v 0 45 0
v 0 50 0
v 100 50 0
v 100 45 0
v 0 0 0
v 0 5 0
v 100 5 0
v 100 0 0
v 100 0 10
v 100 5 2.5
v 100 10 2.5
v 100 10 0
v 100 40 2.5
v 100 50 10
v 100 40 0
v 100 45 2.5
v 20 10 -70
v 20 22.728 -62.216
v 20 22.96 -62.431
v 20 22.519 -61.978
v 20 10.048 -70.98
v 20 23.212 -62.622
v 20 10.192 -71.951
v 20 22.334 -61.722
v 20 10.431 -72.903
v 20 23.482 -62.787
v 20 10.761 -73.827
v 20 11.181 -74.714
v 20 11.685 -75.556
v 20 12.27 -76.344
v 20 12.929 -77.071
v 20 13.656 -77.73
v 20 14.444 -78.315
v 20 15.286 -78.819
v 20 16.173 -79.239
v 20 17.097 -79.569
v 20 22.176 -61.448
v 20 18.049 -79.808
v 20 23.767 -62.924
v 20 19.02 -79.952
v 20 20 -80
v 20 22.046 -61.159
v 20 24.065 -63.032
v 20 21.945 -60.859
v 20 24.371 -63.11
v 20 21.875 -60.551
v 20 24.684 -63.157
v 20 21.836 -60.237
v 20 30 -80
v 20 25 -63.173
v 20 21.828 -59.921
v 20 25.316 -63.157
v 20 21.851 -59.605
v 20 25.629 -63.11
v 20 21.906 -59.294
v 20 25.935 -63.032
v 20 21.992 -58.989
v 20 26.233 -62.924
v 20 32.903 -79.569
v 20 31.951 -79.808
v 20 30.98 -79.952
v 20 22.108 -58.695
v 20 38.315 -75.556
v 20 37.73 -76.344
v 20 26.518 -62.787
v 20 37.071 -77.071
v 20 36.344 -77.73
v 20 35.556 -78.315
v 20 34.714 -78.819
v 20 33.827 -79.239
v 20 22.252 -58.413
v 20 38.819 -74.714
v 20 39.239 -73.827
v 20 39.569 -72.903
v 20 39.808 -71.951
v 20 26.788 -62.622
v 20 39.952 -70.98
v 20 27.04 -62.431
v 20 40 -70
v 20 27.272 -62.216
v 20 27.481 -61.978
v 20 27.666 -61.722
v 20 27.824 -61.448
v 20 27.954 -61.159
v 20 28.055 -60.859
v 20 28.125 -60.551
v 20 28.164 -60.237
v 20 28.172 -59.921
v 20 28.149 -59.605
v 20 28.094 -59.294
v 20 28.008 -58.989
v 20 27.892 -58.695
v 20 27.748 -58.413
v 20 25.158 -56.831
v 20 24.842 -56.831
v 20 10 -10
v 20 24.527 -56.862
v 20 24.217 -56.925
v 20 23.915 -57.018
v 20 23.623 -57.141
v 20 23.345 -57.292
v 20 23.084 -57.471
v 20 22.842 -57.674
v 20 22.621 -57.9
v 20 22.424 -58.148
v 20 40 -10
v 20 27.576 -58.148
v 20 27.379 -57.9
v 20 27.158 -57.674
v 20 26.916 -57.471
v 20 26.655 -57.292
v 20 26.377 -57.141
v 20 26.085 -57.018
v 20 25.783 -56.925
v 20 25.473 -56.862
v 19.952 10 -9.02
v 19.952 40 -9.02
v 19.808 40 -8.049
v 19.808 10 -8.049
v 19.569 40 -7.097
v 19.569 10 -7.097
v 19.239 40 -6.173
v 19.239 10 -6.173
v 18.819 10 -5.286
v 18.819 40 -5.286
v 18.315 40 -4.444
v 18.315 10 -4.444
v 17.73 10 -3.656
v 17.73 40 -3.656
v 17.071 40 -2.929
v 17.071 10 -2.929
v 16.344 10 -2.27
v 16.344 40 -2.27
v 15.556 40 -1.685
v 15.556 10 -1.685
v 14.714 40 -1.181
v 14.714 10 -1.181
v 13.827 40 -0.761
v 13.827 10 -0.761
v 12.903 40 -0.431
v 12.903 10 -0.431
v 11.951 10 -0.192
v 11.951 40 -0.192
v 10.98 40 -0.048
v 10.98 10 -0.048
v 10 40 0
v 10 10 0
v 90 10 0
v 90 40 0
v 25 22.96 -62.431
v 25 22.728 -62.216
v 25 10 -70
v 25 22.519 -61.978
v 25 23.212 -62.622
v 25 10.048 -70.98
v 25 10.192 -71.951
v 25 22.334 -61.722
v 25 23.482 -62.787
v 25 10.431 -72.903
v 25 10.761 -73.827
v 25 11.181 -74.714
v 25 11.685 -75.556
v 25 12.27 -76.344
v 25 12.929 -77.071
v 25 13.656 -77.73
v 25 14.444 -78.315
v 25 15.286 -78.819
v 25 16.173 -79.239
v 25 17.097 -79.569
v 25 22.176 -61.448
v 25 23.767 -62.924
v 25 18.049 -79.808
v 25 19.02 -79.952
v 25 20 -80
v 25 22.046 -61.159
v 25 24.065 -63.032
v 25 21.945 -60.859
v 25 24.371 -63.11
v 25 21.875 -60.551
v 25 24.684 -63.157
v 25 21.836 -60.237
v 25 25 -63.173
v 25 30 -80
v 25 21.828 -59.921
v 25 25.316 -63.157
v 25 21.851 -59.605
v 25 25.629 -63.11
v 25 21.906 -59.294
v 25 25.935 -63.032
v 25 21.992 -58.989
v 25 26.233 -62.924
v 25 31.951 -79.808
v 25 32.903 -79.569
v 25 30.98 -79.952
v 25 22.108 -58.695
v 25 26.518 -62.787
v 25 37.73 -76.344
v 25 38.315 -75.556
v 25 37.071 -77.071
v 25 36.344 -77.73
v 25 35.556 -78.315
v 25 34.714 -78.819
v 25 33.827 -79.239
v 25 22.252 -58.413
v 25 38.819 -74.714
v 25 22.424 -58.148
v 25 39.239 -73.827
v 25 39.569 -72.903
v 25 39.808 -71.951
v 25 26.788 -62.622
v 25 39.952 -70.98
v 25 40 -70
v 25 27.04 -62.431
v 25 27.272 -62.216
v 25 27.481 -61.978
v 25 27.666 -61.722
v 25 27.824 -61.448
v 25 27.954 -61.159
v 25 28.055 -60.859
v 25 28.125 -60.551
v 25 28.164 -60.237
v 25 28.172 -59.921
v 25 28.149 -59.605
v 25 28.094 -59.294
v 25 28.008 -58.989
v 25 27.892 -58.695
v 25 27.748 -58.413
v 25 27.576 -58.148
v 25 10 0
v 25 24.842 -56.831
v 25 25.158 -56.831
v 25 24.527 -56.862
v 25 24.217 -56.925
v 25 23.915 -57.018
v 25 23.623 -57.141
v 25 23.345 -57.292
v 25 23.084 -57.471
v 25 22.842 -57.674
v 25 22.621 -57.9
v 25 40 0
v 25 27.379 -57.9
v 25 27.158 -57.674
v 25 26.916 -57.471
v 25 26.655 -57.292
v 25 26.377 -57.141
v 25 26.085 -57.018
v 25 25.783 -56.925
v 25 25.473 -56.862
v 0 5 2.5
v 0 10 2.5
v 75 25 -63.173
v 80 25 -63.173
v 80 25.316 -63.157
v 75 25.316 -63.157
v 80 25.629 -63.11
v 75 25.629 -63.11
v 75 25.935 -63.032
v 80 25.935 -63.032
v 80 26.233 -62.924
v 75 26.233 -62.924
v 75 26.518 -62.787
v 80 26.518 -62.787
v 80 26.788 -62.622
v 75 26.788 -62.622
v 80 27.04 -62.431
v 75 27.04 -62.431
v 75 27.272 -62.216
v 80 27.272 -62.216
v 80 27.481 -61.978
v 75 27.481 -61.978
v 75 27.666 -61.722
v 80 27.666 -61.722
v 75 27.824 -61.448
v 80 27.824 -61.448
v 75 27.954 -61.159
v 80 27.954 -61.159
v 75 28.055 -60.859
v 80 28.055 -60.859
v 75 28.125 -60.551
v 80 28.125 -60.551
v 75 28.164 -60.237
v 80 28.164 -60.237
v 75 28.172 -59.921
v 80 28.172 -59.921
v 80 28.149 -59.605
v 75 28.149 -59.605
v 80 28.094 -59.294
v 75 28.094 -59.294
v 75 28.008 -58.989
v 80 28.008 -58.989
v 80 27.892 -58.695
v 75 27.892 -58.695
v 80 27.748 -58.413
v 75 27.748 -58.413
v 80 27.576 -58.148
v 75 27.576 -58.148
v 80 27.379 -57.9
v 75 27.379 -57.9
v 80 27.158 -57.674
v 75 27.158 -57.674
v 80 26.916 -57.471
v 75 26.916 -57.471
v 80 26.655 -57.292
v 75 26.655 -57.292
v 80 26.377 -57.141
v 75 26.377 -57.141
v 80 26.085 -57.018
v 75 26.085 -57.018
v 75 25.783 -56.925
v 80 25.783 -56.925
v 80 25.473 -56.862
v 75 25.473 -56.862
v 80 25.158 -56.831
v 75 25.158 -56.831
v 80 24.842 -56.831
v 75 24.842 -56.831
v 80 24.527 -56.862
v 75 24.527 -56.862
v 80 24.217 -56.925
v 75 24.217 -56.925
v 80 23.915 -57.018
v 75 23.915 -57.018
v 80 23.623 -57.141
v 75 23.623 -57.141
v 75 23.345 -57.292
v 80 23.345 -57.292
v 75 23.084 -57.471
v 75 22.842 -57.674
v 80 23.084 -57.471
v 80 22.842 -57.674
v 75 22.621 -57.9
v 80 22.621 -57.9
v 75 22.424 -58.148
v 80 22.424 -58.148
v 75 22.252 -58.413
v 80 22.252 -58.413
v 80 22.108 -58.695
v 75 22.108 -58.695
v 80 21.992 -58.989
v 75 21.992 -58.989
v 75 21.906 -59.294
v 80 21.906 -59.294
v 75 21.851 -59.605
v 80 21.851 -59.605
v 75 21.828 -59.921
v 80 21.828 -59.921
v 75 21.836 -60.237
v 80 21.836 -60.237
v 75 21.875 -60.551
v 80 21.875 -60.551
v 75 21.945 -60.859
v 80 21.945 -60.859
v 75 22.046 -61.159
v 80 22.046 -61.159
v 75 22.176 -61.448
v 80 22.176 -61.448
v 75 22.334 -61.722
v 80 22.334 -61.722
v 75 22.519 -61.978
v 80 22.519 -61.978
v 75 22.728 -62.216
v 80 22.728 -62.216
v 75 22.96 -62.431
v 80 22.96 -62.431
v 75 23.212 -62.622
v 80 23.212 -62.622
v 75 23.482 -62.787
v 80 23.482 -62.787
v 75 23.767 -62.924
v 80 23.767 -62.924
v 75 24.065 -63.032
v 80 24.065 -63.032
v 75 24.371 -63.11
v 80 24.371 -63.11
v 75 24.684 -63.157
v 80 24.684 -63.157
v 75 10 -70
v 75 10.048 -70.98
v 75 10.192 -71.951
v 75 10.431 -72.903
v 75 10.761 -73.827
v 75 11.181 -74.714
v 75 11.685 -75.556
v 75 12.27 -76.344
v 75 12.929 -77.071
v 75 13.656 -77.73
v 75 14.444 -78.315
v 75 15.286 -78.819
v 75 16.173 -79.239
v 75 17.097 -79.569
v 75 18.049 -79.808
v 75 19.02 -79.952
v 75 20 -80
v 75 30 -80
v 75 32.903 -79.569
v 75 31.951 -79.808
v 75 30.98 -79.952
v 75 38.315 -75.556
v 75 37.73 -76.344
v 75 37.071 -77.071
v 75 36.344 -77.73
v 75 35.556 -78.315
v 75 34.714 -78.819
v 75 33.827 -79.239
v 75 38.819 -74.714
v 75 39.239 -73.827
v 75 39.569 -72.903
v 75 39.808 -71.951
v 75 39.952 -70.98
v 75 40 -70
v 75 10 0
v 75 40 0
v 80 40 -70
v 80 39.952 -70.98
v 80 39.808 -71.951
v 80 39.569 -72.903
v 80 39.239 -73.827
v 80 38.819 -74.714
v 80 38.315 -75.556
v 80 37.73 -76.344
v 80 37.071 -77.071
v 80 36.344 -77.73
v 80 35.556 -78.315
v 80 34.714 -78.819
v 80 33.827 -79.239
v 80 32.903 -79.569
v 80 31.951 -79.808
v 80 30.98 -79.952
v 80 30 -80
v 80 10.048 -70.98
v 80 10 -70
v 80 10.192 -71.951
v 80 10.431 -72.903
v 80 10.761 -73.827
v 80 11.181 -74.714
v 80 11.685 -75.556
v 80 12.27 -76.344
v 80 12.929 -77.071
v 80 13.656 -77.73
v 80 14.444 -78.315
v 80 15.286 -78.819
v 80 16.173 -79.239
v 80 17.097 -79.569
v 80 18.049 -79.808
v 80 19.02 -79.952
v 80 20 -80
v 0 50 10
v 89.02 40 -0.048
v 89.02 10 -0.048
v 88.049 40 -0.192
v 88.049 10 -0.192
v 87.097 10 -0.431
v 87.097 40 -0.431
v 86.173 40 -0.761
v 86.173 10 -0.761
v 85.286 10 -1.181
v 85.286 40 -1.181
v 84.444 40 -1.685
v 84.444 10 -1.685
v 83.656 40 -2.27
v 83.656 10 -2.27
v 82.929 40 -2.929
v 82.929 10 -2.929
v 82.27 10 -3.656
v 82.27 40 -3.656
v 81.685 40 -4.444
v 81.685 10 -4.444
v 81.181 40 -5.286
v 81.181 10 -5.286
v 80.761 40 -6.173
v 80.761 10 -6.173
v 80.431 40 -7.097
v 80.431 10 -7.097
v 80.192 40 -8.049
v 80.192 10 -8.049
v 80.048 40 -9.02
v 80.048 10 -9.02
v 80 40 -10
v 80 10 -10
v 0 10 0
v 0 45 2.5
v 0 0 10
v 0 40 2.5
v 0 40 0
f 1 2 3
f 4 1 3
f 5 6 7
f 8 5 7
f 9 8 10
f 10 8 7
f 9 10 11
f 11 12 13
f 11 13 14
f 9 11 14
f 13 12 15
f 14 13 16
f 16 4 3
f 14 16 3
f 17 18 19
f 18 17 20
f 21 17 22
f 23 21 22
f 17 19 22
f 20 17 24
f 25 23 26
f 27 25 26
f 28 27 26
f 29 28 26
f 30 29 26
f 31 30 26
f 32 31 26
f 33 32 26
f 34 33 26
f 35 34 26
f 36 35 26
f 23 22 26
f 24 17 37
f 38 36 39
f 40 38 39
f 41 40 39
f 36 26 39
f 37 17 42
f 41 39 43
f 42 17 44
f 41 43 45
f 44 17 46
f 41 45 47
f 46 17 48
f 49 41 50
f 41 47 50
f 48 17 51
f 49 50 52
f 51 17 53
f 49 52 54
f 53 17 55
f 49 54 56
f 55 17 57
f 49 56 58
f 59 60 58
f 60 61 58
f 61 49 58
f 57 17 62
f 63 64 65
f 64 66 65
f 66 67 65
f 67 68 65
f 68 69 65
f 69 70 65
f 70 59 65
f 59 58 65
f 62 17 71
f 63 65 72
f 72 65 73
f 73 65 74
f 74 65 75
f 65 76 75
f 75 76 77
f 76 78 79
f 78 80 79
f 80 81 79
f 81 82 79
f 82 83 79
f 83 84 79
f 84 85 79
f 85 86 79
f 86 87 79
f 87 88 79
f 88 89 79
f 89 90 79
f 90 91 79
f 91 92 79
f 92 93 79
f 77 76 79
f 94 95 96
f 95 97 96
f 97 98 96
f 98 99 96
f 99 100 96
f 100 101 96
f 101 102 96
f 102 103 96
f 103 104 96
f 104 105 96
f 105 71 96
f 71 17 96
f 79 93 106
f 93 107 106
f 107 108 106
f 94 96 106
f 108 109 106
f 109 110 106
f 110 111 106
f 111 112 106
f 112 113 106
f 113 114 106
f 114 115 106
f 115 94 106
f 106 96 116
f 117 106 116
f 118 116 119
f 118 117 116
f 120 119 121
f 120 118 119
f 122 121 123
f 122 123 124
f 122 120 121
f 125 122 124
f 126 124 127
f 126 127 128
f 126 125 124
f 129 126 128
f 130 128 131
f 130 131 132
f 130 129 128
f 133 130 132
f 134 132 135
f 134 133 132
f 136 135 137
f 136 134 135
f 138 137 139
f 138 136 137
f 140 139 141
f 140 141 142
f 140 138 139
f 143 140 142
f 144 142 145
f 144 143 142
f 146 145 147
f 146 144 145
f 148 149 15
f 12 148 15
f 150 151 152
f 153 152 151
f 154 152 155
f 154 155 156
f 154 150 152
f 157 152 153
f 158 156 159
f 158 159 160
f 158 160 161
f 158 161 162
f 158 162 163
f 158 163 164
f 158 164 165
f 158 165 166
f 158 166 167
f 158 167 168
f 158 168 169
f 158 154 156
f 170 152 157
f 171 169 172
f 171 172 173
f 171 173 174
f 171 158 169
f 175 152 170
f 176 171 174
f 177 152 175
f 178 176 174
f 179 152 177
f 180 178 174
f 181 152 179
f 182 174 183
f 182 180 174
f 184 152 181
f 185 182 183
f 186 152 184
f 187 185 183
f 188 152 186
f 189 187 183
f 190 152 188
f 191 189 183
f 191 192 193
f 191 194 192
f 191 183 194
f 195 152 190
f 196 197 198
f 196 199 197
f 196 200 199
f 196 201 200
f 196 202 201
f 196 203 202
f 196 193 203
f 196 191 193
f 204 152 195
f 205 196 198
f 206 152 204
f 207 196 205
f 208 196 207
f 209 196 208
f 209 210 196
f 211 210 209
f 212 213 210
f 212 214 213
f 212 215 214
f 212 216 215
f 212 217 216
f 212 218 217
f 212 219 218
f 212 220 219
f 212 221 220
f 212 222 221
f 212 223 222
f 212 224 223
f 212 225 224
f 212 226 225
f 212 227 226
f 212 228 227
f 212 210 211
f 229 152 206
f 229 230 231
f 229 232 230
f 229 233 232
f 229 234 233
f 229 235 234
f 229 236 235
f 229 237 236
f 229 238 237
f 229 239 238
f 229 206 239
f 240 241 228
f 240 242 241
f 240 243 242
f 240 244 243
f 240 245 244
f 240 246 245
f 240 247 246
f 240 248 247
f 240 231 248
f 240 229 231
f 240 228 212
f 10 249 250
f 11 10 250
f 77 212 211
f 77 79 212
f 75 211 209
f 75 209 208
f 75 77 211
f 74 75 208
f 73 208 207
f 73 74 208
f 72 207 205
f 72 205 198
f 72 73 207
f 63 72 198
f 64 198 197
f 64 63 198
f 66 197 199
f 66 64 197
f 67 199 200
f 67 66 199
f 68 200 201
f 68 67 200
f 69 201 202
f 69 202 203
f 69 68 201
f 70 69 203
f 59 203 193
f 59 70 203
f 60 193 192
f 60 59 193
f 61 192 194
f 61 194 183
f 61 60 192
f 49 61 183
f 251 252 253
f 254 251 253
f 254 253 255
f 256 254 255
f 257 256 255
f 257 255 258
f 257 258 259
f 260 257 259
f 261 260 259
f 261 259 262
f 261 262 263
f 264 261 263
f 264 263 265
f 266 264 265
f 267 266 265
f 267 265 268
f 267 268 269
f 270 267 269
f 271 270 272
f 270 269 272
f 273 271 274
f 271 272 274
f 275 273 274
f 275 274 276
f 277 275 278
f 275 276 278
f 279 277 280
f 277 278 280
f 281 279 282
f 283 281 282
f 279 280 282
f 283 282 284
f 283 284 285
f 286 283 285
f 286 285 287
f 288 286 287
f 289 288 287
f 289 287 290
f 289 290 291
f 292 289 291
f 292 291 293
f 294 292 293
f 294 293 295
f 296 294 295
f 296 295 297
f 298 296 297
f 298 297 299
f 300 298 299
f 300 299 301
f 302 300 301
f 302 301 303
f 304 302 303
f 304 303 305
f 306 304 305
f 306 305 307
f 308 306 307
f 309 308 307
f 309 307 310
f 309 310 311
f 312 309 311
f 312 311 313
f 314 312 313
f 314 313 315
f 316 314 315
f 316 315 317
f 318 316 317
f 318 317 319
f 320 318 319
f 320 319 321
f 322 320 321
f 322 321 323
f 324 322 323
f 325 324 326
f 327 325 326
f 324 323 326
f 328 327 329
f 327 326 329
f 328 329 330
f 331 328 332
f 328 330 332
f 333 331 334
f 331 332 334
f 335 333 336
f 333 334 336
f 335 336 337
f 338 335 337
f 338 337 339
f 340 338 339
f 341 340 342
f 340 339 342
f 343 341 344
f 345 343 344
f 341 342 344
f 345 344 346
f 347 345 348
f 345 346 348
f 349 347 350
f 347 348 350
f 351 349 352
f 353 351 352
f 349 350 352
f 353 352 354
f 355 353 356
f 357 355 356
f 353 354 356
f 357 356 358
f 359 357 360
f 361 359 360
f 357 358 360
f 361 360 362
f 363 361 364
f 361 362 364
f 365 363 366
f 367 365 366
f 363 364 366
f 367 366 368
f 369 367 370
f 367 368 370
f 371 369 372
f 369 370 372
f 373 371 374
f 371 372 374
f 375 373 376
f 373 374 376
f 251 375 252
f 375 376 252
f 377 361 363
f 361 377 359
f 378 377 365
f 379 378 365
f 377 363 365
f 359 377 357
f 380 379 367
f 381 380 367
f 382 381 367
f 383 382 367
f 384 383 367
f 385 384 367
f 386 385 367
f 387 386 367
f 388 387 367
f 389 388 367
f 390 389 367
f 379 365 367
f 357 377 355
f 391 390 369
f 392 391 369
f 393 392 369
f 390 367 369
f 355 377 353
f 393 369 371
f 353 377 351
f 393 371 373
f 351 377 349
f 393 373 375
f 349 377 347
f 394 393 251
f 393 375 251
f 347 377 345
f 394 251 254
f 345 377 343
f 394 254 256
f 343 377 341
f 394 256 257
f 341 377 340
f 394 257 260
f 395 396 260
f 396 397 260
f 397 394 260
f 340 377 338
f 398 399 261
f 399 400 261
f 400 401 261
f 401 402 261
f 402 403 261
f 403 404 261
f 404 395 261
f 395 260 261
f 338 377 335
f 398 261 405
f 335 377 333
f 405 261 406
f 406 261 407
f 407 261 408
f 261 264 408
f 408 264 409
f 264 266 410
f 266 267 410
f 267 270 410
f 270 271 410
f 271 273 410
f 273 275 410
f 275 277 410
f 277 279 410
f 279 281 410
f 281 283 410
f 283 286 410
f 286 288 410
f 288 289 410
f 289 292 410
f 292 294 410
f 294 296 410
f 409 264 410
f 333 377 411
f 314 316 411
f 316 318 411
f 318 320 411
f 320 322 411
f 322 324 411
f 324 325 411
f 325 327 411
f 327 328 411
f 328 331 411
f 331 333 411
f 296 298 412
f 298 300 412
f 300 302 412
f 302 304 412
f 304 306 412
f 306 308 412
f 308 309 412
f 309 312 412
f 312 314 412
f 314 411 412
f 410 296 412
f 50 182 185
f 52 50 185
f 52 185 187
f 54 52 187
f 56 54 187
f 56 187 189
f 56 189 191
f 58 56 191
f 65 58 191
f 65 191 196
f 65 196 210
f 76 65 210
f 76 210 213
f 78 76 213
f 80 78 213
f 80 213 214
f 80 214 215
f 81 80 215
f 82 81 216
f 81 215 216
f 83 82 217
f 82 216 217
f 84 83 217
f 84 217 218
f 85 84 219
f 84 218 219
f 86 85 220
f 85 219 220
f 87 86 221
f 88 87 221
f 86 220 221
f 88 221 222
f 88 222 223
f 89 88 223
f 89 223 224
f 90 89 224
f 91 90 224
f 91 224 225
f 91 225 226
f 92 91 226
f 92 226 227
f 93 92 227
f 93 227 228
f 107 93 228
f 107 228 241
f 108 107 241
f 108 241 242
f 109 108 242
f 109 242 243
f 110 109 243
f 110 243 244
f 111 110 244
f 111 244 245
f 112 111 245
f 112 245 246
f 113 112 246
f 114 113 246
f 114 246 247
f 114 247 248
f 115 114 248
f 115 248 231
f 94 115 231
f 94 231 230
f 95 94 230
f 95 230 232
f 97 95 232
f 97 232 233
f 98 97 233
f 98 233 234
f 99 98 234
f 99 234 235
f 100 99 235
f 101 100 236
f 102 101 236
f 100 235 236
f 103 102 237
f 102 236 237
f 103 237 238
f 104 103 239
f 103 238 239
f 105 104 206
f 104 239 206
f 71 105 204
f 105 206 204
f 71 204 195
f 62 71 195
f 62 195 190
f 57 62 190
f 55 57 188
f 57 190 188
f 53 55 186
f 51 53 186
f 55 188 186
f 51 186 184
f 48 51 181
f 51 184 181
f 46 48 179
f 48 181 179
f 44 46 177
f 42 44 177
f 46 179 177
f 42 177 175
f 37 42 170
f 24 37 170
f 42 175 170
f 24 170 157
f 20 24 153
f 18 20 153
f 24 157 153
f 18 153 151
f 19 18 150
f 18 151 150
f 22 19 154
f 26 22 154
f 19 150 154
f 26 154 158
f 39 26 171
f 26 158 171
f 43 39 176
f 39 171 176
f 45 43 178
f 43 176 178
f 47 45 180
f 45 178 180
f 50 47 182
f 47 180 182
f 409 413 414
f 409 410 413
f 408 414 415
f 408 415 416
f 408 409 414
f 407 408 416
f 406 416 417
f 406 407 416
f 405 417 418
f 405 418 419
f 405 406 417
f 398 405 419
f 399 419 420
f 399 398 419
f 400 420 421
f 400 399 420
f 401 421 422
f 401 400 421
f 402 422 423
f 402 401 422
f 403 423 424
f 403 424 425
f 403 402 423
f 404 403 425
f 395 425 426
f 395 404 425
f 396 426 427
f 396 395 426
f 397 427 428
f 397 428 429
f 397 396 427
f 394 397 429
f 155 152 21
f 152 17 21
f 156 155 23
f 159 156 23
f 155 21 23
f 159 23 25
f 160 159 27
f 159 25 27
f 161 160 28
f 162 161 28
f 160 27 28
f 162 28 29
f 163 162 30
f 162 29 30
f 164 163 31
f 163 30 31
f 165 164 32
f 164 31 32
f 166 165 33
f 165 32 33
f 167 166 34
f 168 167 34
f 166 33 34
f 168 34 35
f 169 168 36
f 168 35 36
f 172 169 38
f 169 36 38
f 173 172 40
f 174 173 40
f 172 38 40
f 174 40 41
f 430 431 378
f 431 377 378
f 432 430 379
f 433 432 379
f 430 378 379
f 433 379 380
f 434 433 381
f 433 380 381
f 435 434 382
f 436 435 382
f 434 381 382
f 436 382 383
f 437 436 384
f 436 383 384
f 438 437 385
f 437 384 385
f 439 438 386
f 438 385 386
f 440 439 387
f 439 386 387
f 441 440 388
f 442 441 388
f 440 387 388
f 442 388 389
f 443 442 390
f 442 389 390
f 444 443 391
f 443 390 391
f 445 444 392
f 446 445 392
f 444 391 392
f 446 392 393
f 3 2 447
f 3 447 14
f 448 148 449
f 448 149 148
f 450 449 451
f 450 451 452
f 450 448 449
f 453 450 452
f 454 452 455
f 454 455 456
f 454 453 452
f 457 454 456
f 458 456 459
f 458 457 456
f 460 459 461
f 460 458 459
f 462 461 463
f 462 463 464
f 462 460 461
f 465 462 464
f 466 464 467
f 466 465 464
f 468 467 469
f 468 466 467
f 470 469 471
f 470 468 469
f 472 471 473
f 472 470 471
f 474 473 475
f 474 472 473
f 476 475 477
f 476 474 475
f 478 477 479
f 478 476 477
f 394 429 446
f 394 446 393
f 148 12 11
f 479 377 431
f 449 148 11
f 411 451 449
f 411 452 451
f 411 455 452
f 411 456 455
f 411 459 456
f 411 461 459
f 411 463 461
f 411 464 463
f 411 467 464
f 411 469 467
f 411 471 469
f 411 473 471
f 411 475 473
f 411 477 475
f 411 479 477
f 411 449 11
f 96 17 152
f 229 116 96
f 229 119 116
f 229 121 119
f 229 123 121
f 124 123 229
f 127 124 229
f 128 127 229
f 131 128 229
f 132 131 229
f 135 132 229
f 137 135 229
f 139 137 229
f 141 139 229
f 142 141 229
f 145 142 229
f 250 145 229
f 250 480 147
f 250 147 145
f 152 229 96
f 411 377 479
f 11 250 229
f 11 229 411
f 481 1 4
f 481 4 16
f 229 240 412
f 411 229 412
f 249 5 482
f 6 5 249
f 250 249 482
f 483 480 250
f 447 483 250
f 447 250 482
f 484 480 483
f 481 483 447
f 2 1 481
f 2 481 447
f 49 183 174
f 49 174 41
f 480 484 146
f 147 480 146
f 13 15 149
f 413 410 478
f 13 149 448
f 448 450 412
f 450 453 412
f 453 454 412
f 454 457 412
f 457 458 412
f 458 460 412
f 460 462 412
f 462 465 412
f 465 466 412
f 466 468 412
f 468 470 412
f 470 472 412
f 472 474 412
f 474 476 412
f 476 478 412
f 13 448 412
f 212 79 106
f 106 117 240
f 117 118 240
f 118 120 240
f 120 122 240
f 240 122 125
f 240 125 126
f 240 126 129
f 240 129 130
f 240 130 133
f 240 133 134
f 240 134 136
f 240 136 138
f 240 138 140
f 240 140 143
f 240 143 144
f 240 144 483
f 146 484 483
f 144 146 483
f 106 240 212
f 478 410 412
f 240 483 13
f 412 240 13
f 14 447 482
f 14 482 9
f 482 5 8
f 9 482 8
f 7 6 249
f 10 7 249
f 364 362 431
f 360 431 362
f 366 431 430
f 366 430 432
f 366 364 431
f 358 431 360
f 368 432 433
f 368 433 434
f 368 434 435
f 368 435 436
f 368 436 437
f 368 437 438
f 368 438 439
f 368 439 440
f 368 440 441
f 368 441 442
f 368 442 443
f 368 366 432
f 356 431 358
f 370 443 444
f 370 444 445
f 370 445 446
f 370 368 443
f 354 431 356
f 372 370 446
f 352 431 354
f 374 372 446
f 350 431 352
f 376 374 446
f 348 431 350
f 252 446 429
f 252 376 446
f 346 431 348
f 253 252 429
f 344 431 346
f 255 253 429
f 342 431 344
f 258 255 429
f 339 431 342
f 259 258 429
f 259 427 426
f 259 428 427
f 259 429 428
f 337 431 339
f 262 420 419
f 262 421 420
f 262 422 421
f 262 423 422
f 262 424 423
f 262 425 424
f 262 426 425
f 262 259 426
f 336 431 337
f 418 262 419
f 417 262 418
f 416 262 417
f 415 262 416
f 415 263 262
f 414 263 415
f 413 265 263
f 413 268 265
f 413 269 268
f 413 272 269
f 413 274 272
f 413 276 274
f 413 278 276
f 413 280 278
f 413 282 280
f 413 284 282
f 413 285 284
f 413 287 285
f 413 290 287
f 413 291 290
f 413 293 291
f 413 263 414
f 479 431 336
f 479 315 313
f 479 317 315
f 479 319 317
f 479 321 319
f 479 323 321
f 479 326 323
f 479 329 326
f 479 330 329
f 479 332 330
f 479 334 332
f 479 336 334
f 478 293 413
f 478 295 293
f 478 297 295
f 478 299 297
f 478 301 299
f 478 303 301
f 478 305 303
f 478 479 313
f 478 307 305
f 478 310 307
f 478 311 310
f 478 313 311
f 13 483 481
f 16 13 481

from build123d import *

# Parameters (mm, degrees)
SKETCH1_W               = 100
SKETCH1_H               = 50
BOSS_EXTRUDE1_DEPTH     = 10
SKETCH2_W               = 2.5
SKETCH2_H               = 5
CUT_EXTRUDE1_DEPTH      = 1
CUT_EXTRUDE1_DEPTH_BACK = 101
SKETCH4_W               = 5
SKETCH4_H               = 30
BOSS_EXTRUDE2_DEPTH     = 80
SKETCH5_R               = 3.173204402
CUT_EXTRUDE3_DEPTH      = 21
CUT_EXTRUDE3_DEPTH_BACK = 81
FILLET1_R               = 10
FILLET2_R               = 10


with BuildPart() as part:
    # Sketch1 → Boss-Extrude1 (new body)
    with BuildSketch(Plane.XY):
        with Locations((50, 25)):
            Rectangle(SKETCH1_W, SKETCH1_H)
    extrude(amount=BOSS_EXTRUDE1_DEPTH)

    # Sketch2 → Cut-Extrude1 (cut, two sides)
    with BuildSketch(Plane.ZY) as cut_extrude1_sk:
        with Locations((1.25, 42.5)):
            Rectangle(SKETCH2_W, SKETCH2_H)
        with Locations((1.25, 7.5)):
            Rectangle(SKETCH2_W, SKETCH2_H)
    extrude(amount=CUT_EXTRUDE1_DEPTH, mode=Mode.SUBTRACT)
    extrude(cut_extrude1_sk.sketch, amount=-CUT_EXTRUDE1_DEPTH_BACK, mode=Mode.SUBTRACT)

    # Sketch4 → Boss-Extrude2 (add)
    with BuildSketch(Plane(origin=(0, 0, 0), x_dir=(-1, 0, 0), z_dir=(0, 0, -1))):
        with Locations((-77.5, 25)):
            Rectangle(SKETCH4_W, SKETCH4_H)
        with Locations((-22.5, 25)):
            Rectangle(SKETCH4_W, SKETCH4_H)
    extrude(amount=BOSS_EXTRUDE2_DEPTH)

    # Sketch5 → Cut-Extrude3 (cut, two sides)
    with BuildSketch(Plane(origin=(80, 0, 0), x_dir=(0, 0, -1), z_dir=(1, 0, 0))) as cut_extrude3_sk:
        with Locations((60, 25)):
            Circle(SKETCH5_R)
    extrude(amount=CUT_EXTRUDE3_DEPTH, mode=Mode.SUBTRACT)
    extrude(cut_extrude3_sk.sketch, amount=-CUT_EXTRUDE3_DEPTH_BACK, mode=Mode.SUBTRACT)

    # Fillet1
    fillet1_edges = [part.edges().sort_by_distance(p)[0] for p in [
        (77.5, 40, -80),
        (77.5, 10, -80),
        (22.5, 10, -80),
        (22.5, 40, -80),
    ]]
    fillet(fillet1_edges, radius=FILLET1_R)

    # Fillet2
    fillet2_edges = [part.edges().sort_by_distance(p)[0] for p in [
        (80, 25, 0),
        (20, 25, 0),
    ]]
    fillet(fillet2_edges, radius=FILLET2_R)


solid = part.part
